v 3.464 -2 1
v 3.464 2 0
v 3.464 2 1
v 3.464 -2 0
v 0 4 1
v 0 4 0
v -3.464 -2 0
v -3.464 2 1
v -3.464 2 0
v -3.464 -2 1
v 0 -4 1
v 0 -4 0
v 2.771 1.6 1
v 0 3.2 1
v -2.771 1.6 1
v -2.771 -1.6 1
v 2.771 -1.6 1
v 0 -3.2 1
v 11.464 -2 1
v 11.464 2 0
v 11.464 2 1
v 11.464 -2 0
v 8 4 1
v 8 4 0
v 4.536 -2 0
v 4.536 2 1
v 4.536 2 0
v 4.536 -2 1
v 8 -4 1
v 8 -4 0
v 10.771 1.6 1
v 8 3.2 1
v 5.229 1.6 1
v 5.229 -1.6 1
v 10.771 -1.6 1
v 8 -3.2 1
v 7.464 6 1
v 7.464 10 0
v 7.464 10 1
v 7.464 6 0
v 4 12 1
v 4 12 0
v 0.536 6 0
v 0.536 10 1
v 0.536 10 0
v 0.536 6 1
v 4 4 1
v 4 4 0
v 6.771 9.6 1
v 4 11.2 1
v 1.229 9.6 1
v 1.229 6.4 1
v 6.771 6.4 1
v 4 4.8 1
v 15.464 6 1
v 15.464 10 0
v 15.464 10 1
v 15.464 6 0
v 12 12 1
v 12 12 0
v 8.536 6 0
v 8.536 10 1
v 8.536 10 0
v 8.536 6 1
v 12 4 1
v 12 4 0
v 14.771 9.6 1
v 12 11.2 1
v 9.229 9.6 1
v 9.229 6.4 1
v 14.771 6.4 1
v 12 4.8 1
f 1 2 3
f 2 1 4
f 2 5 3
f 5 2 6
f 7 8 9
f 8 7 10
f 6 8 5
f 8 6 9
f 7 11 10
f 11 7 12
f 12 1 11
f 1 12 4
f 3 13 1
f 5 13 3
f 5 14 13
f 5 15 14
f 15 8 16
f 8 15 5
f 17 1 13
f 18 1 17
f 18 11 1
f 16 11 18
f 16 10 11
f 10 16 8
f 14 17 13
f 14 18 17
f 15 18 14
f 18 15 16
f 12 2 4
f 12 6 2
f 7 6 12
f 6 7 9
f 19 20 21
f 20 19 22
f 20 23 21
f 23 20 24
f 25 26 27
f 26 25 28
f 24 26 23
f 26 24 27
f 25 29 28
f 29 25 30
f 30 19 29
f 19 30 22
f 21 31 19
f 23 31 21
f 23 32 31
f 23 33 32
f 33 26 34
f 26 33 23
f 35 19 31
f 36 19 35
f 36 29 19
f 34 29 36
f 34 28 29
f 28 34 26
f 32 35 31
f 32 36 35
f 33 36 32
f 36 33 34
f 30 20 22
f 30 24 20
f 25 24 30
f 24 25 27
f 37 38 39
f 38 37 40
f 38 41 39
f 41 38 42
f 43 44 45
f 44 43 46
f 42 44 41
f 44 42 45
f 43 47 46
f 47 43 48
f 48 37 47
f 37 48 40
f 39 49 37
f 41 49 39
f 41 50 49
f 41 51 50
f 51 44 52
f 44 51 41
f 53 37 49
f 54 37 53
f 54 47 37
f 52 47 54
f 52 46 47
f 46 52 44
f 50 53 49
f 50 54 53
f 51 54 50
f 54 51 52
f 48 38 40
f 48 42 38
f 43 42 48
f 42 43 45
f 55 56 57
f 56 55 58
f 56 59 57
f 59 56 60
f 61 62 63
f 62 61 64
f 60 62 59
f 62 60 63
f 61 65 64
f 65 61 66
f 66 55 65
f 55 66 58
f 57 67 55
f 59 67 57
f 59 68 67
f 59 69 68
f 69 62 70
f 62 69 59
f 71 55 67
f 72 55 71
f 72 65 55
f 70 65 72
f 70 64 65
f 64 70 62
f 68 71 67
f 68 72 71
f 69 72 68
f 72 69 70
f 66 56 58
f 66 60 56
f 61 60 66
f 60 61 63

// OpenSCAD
// file: honeycomb.scad
///< Honeycomb Generator
use <math.scad>;

///< Cell parameters mm

cell_height    = 5;
cell_radius    = 5;
cell_thickness = cell_radius * 0.20;
pack           = true;

///< Modules
module cell( height, radius, thickness=1, open=false ){
       z_adjust = open ? 0 : 1;
       r_adjust  = ( radius == thickness ) ? ( radius - ( radius -1 ) ) : thickness;
       difference(){
	cylinder( h=height, r=radius, $fn=6 );
	translate([0,0,z_adjust])color("blue",0.75)cylinder( h=height, r=radius-r_adjust, $fn=6 );
	}
}

module honeycomb( rows, cols, pack=true ) {
       ///< Simple HCP latice
       ///< ( https://en.wikipedia.org/wiki/Close-packing_of_equal_spheres#Simple_hcp_lattice )
       cellsize = pack ? cell_radius * 0.7 : cell_radius ;
       offset = hyp_from_sides( (cellsize * 2), cellsize );
       for( i = [0:rows-1] ){
       	    for( j = [0:cols-1] ){
	    	 translate( [ ( j * offset ) + ( i % 2 ) * (offset/2 ), i * ( cellsize * 2 ), 0 ] )
		 rotate( [0, 0, 90 ] ) ///< Rotate the cells so they are aligned
		 cell( cell_height, cell_radius, cell_thickness );
		 }
	}
}



///< Proto type
honeycomb( 5, 5, pack );
// file: math.scad
///< Math scad module


///< Find the hypotenuse from two sides of a right triangle
function hyp_from_sides( a, b ) = sqrt( pow( a, 2 ) + pow( b, 2 ) );

///< Find equal sides from hypotenuse of a right triangle
function sides_from_hyp(h) = sqrt( pow( h, 2 ) / 2 );

///< Find A from hypotenuse and B
function a_from_hb( h, b ) = sqrt( pow( h, 2 ) - pow( b, 2 ) );

function dist_2d( pt2, pt1 ) = sqrt(pow(( pt2[0]-pt1[0] ),2) + pow(( pt2[1]-pt1[1]),2) );

function mid_pt_2d( pt2, pt1 ) = [( pt1[0]+pt2[0] )/2, ( pt1[1]+pt2[1] )/2, 0 ];
///< Test for math functions

A = 3;
B = 4;
echo("Given A=", A, "and B=", B );
H = hyp_from_sides( A, B );
echo("Hypotenuse=", H );
echo("Calc Correct = ", (H == 5) );

echo("Given H=", H, " which is a hypotenuse with equal sides" );
echo( "the sides=", sides_from_hyp( H ) );

echo("Given H=", H, "B=", 4 );
echo("A=", a_from_hb( H, 4 ) );

echo("Distance from [-1,1] and [3,4] = ", dist_2d( [-1,1],[3,4]) );
// main file
///< Tile generator
use <math.scad>;
use <honeycomb.scad>;

///< obj_parmaters
width     = 8;
radius    = width/2;
///< Modules
module tile( rows, cols, d, pack=1, angle=90 ) {
     size = d * pack;
     for( i = [0:rows-1] ){
	  for( j = [0:cols-1] ){
	       translate( [ ( j * size ) + ( i % 2 ) * (size/2 ), i * ( size ), 0 ] )
		    rotate( [0, 0, angle ] ) 
		    children();
	  }
     }
}

///< Proto type
tile( 2, 2, width, pack=1) cell( 1, radius, radius * 0.2 );
//tile( 2, 2, radius*2) circle(radius, true );
//tile( 2, 2, width+1 )cube( width, true );
